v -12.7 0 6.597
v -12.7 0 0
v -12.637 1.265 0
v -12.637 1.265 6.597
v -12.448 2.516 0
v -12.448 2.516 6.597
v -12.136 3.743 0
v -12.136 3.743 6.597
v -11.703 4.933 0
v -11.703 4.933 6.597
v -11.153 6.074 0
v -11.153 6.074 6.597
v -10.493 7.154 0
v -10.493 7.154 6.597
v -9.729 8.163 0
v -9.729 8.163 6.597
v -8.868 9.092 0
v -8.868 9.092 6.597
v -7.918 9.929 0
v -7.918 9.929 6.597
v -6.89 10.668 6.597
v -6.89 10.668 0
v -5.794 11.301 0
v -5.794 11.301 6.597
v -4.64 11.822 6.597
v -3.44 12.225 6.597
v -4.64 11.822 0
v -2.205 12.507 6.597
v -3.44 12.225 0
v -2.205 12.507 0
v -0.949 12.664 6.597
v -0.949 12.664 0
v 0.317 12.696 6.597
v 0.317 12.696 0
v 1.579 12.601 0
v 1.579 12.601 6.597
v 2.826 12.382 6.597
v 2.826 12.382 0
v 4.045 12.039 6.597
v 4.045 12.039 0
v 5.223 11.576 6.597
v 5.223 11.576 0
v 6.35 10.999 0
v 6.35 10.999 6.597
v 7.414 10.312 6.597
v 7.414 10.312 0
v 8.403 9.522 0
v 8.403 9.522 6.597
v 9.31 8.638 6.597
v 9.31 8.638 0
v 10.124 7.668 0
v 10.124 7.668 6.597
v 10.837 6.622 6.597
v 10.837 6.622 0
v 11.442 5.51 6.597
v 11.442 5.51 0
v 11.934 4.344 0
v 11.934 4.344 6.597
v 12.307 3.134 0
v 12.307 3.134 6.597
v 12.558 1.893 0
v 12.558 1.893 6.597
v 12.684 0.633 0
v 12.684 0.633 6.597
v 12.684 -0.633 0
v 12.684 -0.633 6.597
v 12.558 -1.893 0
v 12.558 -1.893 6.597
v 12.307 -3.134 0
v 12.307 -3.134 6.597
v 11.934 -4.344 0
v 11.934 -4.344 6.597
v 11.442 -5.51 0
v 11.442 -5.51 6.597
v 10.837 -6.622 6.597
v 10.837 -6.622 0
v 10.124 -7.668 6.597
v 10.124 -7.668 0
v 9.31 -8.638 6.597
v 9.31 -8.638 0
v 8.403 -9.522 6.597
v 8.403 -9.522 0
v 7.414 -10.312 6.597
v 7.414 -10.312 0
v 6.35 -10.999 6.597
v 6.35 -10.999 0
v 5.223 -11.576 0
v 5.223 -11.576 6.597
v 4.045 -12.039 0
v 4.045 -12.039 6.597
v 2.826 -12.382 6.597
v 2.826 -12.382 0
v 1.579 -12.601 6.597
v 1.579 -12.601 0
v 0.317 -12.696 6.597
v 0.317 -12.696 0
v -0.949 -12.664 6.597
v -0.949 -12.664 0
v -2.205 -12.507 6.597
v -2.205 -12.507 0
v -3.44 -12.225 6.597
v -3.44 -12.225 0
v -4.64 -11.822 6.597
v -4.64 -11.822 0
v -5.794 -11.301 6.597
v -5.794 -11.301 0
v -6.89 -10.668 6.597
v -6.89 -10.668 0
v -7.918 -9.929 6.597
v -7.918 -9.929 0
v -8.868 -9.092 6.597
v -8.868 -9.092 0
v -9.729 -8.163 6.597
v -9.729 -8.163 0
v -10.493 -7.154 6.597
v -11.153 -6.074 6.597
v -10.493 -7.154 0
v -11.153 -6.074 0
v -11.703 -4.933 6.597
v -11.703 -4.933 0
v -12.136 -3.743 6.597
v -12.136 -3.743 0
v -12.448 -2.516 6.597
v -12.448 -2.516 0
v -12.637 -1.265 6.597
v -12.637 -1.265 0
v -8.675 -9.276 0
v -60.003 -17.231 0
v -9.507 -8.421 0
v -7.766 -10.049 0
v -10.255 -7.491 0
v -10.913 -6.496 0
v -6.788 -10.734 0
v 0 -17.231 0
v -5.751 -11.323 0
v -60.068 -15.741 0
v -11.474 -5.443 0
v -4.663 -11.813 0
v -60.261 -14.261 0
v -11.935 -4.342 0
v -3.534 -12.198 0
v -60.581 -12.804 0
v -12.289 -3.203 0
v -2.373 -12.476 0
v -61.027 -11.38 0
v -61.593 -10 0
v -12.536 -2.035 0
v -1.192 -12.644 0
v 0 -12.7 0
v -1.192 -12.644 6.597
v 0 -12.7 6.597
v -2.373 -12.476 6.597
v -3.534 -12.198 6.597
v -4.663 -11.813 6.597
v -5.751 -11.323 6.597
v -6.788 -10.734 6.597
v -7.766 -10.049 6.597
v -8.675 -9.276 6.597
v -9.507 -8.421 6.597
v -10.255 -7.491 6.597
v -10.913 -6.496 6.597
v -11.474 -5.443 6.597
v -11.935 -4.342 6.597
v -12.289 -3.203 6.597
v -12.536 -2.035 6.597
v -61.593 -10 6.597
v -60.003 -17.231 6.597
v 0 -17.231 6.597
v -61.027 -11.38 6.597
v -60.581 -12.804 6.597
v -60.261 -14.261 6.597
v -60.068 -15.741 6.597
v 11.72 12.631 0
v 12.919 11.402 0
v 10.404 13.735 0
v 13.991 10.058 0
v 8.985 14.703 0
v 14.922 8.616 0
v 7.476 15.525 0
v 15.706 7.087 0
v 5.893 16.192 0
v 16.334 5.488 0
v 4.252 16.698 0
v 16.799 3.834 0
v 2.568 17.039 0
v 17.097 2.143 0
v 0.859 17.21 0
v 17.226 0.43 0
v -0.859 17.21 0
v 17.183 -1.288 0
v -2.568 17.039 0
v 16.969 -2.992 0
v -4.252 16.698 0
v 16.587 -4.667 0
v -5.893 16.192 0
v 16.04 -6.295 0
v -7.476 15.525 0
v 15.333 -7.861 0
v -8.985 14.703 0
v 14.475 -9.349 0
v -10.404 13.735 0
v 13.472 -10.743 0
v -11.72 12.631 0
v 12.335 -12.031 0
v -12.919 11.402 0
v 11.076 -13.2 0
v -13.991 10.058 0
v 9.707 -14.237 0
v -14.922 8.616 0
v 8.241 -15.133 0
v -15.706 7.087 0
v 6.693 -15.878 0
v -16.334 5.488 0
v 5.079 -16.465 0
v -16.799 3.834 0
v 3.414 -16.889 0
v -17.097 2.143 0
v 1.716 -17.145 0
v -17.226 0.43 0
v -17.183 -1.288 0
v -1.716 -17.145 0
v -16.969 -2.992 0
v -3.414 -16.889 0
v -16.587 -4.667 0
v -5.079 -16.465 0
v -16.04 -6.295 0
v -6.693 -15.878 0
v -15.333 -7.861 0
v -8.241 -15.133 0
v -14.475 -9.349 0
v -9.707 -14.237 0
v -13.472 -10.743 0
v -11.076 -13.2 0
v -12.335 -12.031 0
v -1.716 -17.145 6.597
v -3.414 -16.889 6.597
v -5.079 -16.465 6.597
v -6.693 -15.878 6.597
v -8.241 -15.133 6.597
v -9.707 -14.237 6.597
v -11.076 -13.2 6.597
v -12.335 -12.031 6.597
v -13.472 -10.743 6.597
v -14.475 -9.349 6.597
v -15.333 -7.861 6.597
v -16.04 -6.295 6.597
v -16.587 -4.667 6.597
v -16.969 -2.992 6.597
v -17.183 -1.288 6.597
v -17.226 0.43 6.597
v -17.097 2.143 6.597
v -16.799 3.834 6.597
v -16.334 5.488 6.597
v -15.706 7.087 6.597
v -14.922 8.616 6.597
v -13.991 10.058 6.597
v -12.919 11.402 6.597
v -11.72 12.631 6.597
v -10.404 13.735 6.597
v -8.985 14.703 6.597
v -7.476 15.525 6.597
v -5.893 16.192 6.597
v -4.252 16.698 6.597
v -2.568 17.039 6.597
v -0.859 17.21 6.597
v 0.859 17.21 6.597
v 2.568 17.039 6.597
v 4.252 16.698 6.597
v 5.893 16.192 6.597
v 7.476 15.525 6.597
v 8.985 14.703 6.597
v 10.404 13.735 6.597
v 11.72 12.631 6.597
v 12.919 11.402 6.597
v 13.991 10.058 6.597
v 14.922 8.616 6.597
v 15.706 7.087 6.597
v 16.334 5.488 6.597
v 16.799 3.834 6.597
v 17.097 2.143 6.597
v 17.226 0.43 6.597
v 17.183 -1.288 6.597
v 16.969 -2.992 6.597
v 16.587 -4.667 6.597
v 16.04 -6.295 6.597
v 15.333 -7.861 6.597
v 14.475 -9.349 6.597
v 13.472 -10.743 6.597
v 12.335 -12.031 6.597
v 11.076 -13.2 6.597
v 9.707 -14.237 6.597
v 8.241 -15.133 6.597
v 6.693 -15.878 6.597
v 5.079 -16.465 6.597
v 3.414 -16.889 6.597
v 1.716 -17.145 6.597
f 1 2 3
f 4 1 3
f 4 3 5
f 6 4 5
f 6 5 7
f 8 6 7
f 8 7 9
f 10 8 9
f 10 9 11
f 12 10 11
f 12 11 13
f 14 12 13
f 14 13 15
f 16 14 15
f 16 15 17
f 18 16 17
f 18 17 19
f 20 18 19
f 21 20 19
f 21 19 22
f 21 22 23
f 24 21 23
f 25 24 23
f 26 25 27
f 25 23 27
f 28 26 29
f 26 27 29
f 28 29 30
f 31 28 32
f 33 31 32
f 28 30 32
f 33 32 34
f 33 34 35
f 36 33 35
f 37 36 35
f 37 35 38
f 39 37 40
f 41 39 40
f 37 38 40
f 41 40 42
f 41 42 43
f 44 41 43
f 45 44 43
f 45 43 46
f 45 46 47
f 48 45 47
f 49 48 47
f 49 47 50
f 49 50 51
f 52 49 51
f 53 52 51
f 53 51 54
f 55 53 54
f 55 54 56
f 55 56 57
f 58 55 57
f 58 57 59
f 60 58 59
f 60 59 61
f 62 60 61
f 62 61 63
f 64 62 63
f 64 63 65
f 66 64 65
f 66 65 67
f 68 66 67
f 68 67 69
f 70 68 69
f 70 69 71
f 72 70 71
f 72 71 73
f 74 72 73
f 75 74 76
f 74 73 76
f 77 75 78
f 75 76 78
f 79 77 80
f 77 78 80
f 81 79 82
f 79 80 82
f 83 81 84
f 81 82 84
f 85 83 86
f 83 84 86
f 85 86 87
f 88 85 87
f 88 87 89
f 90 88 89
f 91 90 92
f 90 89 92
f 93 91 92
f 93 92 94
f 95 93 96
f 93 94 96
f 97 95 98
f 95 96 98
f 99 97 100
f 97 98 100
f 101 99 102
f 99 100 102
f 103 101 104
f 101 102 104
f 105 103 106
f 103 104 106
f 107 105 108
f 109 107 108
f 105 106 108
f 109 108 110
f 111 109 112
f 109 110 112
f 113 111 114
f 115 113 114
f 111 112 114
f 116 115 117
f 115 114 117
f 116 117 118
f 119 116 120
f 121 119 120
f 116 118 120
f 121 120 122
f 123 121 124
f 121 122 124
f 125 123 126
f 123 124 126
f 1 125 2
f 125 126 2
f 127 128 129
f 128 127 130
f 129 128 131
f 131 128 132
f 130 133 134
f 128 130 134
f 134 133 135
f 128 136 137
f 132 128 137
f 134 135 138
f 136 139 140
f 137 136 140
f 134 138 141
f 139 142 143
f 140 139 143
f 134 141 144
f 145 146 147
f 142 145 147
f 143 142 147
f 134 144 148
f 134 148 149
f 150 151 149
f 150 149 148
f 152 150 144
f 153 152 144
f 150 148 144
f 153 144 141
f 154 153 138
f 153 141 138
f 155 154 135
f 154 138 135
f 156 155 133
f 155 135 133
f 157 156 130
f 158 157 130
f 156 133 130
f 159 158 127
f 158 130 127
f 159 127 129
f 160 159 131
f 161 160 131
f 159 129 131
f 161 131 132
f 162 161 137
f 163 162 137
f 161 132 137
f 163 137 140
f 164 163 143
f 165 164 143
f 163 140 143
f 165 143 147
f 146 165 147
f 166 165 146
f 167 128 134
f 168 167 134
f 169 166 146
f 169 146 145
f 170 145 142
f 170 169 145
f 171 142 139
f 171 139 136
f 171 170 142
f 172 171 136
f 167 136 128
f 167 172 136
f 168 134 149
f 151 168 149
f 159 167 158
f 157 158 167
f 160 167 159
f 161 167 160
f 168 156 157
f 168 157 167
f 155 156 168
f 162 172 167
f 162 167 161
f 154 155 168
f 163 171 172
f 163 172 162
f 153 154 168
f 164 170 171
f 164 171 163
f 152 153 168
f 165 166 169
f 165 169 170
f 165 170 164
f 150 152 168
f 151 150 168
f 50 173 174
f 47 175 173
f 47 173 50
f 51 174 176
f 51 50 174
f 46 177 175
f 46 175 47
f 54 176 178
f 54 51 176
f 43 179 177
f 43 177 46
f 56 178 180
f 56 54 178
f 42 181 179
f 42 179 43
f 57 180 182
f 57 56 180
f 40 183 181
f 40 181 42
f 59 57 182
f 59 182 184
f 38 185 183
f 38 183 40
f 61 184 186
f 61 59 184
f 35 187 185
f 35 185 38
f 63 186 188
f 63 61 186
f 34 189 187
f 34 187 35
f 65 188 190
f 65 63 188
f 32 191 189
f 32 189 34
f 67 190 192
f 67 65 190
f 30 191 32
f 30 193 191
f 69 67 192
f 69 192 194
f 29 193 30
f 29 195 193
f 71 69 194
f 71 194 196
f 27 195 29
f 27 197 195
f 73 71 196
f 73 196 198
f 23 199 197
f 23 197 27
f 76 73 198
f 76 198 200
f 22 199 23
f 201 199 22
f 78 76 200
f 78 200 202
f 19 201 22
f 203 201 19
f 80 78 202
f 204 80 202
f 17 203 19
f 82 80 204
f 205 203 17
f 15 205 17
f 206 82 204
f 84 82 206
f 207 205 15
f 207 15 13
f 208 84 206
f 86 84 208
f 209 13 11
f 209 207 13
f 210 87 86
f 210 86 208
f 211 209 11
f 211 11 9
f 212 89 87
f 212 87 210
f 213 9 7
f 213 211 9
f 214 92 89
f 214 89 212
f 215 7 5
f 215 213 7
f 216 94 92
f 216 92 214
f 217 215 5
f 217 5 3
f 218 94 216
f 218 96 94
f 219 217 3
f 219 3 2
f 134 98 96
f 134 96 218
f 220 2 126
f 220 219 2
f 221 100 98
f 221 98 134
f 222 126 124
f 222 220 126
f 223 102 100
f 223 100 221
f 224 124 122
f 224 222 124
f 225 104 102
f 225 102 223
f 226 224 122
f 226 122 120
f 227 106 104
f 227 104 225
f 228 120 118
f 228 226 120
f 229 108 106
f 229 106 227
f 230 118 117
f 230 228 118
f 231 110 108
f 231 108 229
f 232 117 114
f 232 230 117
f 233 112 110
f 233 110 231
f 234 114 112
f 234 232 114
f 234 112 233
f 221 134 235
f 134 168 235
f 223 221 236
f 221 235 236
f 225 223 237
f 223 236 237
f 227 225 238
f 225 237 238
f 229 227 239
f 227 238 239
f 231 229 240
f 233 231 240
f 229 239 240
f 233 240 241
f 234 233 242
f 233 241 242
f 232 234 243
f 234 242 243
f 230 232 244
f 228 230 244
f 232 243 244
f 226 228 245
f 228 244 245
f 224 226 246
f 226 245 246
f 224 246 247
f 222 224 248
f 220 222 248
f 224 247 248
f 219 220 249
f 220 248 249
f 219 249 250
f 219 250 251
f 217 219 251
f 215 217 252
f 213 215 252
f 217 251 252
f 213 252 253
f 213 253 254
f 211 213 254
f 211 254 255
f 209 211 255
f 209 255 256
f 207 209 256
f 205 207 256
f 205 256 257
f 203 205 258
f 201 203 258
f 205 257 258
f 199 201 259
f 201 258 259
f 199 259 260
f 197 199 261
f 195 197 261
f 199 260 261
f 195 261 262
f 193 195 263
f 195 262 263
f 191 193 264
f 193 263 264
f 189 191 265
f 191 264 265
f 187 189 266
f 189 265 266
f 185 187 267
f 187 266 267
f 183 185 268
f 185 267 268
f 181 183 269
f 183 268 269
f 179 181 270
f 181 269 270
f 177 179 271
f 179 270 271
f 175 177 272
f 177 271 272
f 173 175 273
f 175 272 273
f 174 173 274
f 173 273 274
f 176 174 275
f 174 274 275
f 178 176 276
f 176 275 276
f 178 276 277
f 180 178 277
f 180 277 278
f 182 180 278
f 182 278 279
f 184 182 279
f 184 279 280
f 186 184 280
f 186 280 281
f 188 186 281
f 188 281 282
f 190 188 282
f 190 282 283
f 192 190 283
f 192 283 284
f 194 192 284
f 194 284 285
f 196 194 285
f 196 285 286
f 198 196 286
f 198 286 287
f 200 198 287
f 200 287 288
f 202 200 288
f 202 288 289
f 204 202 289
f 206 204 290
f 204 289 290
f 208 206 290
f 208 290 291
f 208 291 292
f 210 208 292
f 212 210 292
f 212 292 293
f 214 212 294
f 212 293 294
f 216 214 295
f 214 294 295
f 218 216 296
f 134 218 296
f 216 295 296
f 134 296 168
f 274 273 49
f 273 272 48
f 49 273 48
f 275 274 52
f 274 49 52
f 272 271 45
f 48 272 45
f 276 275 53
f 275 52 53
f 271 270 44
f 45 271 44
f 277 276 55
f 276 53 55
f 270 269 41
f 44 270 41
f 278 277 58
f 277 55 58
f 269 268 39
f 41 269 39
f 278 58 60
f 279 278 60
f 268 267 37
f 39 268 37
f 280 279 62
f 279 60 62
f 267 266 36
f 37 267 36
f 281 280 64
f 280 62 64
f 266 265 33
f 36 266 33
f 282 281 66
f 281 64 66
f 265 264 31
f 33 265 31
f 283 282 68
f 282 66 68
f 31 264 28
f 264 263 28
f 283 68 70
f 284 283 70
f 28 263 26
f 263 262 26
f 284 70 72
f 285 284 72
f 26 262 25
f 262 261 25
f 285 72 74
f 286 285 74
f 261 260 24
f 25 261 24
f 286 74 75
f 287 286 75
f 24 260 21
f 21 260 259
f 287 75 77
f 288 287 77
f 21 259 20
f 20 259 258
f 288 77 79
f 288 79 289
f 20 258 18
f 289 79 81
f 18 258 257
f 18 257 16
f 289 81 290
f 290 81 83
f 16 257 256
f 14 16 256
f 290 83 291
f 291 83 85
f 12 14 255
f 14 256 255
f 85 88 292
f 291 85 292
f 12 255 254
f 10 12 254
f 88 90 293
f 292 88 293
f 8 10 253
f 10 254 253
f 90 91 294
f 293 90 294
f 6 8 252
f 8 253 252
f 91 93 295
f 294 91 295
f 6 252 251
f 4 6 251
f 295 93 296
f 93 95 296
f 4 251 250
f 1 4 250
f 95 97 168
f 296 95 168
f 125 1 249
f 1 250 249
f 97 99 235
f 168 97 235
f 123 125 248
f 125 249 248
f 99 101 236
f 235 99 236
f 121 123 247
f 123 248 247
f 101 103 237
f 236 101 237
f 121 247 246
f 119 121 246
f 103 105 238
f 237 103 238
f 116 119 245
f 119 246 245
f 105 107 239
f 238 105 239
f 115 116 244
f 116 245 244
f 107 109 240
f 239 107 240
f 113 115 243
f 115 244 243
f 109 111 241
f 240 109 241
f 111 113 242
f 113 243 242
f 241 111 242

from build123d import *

# Parameters (mm, degrees)
F0_W          = 77.2340670228
F0_H          = 17.2310173512
F1_DEPTH      = 6.596820429
F1_FACE_W     = 77.2340670228
F1_FACE_H     = 6.596820429
F2_ANGLE_BACK = 9.2222213089
F2_ANGLE      = 18.4444426177
F1_FACE1_W    = 17.2310173512
F1_FACE1_H    = 6.596820429
F5_D          = 25.4
F5_2_D        = 25.4
F1_FACE2_W    = 17.2310173512
F1_FACE2_H    = 6.596820429


# Not quite as in the source:
# - the program builds the solid bodies; features that only make, move or delete a surface that nothing else refers to are left out


with BuildPart() as f1:
    # F0 (on Top) → F1 (new body)
    with BuildSketch(Plane.XY):
        with Locations((-38.6170335114, -8.6155086756)):
            Rectangle(F0_W, F0_H)
    extrude(amount=F1_DEPTH)

    # F1_face (on face) → F2 (revolve, cut)
    with BuildSketch(Plane(origin=(-38.6170335114, 0, 3.2984102145), x_dir=(-1, 0, 0), z_dir=(0, 1, 0)), mode=Mode.PRIVATE) as f2_sk:
        Rectangle(F1_FACE_W, F1_FACE_H)
    revolve(f2_sk.sketch.rotate(Axis((0, 0, 3.2984102145), (0, 0, -1)), -F2_ANGLE_BACK), axis=Axis((0, 0, 3.2984102145), (0, 0, -1)), revolution_arc=F2_ANGLE, mode=Mode.SUBTRACT)

    # F5 (through all)
    with Locations(Plane.XY.offset(6.596820429)):
        with Locations((0, 0)):
            Hole(F5_D / 2)

    # F1_face2 (on face) → F6 (revolve, cut)
    with BuildSketch(Plane(origin=(-77.2340670228, -8.6155086756, 3.2984102145), x_dir=(0, -1, 0), z_dir=(-1, 0, 0))):
        Rectangle(F1_FACE2_W, F1_FACE2_H)
    revolve(axis=Axis((-77.2340670228, -17.2310173512, 3.2984102145), (0, 0, -1)), mode=Mode.SUBTRACT)


with BuildPart() as f3:
    # F1_face1 (on face) → F3 (revolve)
    with BuildSketch(Plane(origin=(0, -8.6155086756, 3.2984102145), x_dir=(0, 1, 0), z_dir=(1, 0, 0))):
        Rectangle(F1_FACE1_W, F1_FACE1_H)
    revolve(axis=Axis((0, 0, 3.2984102145), (0, 0, -1)))

    # F5#2 (through all)
    with Locations(Plane.XY.offset(6.596820429)):
        with Locations((0, 0)):
            Hole(F5_2_D / 2)


solid = Compound([f1.part, f3.part])
